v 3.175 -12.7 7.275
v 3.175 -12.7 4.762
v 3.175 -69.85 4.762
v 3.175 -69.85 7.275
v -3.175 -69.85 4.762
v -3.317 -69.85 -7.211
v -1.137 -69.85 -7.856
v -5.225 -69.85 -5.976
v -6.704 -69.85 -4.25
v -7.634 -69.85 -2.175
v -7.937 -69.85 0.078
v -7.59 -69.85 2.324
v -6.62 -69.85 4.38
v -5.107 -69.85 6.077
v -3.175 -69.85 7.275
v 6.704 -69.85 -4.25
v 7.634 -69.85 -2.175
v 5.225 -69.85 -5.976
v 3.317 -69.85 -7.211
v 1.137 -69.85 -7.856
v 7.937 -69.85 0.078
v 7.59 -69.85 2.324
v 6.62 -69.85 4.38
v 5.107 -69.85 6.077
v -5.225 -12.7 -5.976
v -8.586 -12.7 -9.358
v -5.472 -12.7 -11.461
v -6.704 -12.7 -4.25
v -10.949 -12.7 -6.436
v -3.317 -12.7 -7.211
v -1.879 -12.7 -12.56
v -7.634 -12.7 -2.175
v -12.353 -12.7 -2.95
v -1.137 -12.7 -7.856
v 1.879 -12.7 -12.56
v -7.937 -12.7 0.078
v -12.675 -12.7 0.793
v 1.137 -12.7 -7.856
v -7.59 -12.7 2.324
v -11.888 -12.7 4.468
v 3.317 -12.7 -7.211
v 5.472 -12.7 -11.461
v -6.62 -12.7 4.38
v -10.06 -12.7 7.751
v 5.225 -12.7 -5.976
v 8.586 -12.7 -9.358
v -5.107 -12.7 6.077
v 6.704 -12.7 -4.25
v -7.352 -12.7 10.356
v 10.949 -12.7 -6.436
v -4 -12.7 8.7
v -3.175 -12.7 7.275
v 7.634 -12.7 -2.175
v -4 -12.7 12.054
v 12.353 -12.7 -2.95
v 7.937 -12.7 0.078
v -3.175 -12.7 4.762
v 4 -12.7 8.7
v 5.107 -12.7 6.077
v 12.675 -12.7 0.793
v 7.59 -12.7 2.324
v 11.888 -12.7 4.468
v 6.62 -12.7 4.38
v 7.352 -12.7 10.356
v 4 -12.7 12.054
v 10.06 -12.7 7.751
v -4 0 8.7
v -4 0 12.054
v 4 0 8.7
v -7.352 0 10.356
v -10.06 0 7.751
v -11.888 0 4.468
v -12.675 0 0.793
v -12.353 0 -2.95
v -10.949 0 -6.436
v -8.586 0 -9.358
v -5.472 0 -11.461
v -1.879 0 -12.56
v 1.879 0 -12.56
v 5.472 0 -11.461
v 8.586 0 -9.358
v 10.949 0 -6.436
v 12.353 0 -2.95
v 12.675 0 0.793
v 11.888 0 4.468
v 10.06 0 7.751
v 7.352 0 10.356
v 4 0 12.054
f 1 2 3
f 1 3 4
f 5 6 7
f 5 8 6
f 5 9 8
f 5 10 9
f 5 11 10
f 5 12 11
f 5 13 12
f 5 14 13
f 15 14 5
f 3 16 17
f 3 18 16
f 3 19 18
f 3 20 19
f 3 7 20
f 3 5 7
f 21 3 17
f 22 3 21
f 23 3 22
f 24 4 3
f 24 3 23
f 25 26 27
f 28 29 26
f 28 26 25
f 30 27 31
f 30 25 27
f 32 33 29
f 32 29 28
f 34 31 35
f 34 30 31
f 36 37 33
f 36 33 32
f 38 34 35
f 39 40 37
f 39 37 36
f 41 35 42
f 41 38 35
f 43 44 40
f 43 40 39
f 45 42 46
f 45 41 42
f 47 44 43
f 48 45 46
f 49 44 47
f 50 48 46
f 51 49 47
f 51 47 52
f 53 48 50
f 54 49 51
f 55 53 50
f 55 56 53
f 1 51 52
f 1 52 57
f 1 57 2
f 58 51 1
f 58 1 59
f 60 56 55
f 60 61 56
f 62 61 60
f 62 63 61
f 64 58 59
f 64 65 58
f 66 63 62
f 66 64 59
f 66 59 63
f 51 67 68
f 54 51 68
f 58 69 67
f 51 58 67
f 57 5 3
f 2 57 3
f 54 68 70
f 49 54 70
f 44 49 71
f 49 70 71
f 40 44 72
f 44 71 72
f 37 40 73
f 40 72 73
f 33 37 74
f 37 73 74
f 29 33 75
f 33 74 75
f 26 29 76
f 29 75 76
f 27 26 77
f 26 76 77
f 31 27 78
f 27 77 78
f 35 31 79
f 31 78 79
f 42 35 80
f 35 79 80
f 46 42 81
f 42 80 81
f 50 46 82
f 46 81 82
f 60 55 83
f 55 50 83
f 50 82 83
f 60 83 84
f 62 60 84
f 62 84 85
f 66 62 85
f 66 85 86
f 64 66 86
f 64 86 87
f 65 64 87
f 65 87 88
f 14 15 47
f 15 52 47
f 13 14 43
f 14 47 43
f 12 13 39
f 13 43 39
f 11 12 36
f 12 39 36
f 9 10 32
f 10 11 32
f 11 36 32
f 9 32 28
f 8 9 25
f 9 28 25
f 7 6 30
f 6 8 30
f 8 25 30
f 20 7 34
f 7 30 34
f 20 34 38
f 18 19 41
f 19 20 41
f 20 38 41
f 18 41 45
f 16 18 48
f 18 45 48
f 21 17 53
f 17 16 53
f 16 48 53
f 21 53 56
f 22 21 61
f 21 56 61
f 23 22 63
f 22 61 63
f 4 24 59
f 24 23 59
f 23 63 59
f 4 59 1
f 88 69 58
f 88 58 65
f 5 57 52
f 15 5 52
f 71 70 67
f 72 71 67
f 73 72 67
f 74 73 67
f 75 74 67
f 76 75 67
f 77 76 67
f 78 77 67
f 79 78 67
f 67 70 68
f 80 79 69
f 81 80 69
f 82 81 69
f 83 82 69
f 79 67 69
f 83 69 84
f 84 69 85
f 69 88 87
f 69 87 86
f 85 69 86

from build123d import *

# Parameters (mm, degrees)
F0_R     = 12.7
F1_DEPTH = 12.7
F2_R     = 7.9375
F3_DEPTH = 57.15
F4_W     = 8
F4_H     = 8
F5_DEPTH = 69.851
F6_W     = 6.35
F6_H     = 6.35
F7_DEPTH = 57.15


with BuildPart() as f1:
    # F0 (on Front) → F1 (new body)
    with BuildSketch(Plane.XZ):
        Circle(F0_R)
    extrude(amount=F1_DEPTH)

    # F2 (on face) → F3 (join)
    with BuildSketch(Plane.XZ.offset(12.7)):
        Circle(F2_R)
    extrude(amount=F3_DEPTH)

    # F4 (on face) → F5 (cut, through all)
    with BuildSketch(Plane(origin=(0, 0, 0), x_dir=(-1, 0, 0), z_dir=(0, 1, 0))):
        with Locations((0, 12.7)):
            Rectangle(F4_W, F4_H)
    extrude(amount=-F5_DEPTH, mode=Mode.SUBTRACT)

    # F6 (on face) → F7 (cut)
    with BuildSketch(Plane.XZ.offset(69.85)):
        with Locations((0, 7.9375)):
            Rectangle(F6_W, F6_H)
    extrude(amount=-F7_DEPTH, mode=Mode.SUBTRACT)


solid = f1.part
